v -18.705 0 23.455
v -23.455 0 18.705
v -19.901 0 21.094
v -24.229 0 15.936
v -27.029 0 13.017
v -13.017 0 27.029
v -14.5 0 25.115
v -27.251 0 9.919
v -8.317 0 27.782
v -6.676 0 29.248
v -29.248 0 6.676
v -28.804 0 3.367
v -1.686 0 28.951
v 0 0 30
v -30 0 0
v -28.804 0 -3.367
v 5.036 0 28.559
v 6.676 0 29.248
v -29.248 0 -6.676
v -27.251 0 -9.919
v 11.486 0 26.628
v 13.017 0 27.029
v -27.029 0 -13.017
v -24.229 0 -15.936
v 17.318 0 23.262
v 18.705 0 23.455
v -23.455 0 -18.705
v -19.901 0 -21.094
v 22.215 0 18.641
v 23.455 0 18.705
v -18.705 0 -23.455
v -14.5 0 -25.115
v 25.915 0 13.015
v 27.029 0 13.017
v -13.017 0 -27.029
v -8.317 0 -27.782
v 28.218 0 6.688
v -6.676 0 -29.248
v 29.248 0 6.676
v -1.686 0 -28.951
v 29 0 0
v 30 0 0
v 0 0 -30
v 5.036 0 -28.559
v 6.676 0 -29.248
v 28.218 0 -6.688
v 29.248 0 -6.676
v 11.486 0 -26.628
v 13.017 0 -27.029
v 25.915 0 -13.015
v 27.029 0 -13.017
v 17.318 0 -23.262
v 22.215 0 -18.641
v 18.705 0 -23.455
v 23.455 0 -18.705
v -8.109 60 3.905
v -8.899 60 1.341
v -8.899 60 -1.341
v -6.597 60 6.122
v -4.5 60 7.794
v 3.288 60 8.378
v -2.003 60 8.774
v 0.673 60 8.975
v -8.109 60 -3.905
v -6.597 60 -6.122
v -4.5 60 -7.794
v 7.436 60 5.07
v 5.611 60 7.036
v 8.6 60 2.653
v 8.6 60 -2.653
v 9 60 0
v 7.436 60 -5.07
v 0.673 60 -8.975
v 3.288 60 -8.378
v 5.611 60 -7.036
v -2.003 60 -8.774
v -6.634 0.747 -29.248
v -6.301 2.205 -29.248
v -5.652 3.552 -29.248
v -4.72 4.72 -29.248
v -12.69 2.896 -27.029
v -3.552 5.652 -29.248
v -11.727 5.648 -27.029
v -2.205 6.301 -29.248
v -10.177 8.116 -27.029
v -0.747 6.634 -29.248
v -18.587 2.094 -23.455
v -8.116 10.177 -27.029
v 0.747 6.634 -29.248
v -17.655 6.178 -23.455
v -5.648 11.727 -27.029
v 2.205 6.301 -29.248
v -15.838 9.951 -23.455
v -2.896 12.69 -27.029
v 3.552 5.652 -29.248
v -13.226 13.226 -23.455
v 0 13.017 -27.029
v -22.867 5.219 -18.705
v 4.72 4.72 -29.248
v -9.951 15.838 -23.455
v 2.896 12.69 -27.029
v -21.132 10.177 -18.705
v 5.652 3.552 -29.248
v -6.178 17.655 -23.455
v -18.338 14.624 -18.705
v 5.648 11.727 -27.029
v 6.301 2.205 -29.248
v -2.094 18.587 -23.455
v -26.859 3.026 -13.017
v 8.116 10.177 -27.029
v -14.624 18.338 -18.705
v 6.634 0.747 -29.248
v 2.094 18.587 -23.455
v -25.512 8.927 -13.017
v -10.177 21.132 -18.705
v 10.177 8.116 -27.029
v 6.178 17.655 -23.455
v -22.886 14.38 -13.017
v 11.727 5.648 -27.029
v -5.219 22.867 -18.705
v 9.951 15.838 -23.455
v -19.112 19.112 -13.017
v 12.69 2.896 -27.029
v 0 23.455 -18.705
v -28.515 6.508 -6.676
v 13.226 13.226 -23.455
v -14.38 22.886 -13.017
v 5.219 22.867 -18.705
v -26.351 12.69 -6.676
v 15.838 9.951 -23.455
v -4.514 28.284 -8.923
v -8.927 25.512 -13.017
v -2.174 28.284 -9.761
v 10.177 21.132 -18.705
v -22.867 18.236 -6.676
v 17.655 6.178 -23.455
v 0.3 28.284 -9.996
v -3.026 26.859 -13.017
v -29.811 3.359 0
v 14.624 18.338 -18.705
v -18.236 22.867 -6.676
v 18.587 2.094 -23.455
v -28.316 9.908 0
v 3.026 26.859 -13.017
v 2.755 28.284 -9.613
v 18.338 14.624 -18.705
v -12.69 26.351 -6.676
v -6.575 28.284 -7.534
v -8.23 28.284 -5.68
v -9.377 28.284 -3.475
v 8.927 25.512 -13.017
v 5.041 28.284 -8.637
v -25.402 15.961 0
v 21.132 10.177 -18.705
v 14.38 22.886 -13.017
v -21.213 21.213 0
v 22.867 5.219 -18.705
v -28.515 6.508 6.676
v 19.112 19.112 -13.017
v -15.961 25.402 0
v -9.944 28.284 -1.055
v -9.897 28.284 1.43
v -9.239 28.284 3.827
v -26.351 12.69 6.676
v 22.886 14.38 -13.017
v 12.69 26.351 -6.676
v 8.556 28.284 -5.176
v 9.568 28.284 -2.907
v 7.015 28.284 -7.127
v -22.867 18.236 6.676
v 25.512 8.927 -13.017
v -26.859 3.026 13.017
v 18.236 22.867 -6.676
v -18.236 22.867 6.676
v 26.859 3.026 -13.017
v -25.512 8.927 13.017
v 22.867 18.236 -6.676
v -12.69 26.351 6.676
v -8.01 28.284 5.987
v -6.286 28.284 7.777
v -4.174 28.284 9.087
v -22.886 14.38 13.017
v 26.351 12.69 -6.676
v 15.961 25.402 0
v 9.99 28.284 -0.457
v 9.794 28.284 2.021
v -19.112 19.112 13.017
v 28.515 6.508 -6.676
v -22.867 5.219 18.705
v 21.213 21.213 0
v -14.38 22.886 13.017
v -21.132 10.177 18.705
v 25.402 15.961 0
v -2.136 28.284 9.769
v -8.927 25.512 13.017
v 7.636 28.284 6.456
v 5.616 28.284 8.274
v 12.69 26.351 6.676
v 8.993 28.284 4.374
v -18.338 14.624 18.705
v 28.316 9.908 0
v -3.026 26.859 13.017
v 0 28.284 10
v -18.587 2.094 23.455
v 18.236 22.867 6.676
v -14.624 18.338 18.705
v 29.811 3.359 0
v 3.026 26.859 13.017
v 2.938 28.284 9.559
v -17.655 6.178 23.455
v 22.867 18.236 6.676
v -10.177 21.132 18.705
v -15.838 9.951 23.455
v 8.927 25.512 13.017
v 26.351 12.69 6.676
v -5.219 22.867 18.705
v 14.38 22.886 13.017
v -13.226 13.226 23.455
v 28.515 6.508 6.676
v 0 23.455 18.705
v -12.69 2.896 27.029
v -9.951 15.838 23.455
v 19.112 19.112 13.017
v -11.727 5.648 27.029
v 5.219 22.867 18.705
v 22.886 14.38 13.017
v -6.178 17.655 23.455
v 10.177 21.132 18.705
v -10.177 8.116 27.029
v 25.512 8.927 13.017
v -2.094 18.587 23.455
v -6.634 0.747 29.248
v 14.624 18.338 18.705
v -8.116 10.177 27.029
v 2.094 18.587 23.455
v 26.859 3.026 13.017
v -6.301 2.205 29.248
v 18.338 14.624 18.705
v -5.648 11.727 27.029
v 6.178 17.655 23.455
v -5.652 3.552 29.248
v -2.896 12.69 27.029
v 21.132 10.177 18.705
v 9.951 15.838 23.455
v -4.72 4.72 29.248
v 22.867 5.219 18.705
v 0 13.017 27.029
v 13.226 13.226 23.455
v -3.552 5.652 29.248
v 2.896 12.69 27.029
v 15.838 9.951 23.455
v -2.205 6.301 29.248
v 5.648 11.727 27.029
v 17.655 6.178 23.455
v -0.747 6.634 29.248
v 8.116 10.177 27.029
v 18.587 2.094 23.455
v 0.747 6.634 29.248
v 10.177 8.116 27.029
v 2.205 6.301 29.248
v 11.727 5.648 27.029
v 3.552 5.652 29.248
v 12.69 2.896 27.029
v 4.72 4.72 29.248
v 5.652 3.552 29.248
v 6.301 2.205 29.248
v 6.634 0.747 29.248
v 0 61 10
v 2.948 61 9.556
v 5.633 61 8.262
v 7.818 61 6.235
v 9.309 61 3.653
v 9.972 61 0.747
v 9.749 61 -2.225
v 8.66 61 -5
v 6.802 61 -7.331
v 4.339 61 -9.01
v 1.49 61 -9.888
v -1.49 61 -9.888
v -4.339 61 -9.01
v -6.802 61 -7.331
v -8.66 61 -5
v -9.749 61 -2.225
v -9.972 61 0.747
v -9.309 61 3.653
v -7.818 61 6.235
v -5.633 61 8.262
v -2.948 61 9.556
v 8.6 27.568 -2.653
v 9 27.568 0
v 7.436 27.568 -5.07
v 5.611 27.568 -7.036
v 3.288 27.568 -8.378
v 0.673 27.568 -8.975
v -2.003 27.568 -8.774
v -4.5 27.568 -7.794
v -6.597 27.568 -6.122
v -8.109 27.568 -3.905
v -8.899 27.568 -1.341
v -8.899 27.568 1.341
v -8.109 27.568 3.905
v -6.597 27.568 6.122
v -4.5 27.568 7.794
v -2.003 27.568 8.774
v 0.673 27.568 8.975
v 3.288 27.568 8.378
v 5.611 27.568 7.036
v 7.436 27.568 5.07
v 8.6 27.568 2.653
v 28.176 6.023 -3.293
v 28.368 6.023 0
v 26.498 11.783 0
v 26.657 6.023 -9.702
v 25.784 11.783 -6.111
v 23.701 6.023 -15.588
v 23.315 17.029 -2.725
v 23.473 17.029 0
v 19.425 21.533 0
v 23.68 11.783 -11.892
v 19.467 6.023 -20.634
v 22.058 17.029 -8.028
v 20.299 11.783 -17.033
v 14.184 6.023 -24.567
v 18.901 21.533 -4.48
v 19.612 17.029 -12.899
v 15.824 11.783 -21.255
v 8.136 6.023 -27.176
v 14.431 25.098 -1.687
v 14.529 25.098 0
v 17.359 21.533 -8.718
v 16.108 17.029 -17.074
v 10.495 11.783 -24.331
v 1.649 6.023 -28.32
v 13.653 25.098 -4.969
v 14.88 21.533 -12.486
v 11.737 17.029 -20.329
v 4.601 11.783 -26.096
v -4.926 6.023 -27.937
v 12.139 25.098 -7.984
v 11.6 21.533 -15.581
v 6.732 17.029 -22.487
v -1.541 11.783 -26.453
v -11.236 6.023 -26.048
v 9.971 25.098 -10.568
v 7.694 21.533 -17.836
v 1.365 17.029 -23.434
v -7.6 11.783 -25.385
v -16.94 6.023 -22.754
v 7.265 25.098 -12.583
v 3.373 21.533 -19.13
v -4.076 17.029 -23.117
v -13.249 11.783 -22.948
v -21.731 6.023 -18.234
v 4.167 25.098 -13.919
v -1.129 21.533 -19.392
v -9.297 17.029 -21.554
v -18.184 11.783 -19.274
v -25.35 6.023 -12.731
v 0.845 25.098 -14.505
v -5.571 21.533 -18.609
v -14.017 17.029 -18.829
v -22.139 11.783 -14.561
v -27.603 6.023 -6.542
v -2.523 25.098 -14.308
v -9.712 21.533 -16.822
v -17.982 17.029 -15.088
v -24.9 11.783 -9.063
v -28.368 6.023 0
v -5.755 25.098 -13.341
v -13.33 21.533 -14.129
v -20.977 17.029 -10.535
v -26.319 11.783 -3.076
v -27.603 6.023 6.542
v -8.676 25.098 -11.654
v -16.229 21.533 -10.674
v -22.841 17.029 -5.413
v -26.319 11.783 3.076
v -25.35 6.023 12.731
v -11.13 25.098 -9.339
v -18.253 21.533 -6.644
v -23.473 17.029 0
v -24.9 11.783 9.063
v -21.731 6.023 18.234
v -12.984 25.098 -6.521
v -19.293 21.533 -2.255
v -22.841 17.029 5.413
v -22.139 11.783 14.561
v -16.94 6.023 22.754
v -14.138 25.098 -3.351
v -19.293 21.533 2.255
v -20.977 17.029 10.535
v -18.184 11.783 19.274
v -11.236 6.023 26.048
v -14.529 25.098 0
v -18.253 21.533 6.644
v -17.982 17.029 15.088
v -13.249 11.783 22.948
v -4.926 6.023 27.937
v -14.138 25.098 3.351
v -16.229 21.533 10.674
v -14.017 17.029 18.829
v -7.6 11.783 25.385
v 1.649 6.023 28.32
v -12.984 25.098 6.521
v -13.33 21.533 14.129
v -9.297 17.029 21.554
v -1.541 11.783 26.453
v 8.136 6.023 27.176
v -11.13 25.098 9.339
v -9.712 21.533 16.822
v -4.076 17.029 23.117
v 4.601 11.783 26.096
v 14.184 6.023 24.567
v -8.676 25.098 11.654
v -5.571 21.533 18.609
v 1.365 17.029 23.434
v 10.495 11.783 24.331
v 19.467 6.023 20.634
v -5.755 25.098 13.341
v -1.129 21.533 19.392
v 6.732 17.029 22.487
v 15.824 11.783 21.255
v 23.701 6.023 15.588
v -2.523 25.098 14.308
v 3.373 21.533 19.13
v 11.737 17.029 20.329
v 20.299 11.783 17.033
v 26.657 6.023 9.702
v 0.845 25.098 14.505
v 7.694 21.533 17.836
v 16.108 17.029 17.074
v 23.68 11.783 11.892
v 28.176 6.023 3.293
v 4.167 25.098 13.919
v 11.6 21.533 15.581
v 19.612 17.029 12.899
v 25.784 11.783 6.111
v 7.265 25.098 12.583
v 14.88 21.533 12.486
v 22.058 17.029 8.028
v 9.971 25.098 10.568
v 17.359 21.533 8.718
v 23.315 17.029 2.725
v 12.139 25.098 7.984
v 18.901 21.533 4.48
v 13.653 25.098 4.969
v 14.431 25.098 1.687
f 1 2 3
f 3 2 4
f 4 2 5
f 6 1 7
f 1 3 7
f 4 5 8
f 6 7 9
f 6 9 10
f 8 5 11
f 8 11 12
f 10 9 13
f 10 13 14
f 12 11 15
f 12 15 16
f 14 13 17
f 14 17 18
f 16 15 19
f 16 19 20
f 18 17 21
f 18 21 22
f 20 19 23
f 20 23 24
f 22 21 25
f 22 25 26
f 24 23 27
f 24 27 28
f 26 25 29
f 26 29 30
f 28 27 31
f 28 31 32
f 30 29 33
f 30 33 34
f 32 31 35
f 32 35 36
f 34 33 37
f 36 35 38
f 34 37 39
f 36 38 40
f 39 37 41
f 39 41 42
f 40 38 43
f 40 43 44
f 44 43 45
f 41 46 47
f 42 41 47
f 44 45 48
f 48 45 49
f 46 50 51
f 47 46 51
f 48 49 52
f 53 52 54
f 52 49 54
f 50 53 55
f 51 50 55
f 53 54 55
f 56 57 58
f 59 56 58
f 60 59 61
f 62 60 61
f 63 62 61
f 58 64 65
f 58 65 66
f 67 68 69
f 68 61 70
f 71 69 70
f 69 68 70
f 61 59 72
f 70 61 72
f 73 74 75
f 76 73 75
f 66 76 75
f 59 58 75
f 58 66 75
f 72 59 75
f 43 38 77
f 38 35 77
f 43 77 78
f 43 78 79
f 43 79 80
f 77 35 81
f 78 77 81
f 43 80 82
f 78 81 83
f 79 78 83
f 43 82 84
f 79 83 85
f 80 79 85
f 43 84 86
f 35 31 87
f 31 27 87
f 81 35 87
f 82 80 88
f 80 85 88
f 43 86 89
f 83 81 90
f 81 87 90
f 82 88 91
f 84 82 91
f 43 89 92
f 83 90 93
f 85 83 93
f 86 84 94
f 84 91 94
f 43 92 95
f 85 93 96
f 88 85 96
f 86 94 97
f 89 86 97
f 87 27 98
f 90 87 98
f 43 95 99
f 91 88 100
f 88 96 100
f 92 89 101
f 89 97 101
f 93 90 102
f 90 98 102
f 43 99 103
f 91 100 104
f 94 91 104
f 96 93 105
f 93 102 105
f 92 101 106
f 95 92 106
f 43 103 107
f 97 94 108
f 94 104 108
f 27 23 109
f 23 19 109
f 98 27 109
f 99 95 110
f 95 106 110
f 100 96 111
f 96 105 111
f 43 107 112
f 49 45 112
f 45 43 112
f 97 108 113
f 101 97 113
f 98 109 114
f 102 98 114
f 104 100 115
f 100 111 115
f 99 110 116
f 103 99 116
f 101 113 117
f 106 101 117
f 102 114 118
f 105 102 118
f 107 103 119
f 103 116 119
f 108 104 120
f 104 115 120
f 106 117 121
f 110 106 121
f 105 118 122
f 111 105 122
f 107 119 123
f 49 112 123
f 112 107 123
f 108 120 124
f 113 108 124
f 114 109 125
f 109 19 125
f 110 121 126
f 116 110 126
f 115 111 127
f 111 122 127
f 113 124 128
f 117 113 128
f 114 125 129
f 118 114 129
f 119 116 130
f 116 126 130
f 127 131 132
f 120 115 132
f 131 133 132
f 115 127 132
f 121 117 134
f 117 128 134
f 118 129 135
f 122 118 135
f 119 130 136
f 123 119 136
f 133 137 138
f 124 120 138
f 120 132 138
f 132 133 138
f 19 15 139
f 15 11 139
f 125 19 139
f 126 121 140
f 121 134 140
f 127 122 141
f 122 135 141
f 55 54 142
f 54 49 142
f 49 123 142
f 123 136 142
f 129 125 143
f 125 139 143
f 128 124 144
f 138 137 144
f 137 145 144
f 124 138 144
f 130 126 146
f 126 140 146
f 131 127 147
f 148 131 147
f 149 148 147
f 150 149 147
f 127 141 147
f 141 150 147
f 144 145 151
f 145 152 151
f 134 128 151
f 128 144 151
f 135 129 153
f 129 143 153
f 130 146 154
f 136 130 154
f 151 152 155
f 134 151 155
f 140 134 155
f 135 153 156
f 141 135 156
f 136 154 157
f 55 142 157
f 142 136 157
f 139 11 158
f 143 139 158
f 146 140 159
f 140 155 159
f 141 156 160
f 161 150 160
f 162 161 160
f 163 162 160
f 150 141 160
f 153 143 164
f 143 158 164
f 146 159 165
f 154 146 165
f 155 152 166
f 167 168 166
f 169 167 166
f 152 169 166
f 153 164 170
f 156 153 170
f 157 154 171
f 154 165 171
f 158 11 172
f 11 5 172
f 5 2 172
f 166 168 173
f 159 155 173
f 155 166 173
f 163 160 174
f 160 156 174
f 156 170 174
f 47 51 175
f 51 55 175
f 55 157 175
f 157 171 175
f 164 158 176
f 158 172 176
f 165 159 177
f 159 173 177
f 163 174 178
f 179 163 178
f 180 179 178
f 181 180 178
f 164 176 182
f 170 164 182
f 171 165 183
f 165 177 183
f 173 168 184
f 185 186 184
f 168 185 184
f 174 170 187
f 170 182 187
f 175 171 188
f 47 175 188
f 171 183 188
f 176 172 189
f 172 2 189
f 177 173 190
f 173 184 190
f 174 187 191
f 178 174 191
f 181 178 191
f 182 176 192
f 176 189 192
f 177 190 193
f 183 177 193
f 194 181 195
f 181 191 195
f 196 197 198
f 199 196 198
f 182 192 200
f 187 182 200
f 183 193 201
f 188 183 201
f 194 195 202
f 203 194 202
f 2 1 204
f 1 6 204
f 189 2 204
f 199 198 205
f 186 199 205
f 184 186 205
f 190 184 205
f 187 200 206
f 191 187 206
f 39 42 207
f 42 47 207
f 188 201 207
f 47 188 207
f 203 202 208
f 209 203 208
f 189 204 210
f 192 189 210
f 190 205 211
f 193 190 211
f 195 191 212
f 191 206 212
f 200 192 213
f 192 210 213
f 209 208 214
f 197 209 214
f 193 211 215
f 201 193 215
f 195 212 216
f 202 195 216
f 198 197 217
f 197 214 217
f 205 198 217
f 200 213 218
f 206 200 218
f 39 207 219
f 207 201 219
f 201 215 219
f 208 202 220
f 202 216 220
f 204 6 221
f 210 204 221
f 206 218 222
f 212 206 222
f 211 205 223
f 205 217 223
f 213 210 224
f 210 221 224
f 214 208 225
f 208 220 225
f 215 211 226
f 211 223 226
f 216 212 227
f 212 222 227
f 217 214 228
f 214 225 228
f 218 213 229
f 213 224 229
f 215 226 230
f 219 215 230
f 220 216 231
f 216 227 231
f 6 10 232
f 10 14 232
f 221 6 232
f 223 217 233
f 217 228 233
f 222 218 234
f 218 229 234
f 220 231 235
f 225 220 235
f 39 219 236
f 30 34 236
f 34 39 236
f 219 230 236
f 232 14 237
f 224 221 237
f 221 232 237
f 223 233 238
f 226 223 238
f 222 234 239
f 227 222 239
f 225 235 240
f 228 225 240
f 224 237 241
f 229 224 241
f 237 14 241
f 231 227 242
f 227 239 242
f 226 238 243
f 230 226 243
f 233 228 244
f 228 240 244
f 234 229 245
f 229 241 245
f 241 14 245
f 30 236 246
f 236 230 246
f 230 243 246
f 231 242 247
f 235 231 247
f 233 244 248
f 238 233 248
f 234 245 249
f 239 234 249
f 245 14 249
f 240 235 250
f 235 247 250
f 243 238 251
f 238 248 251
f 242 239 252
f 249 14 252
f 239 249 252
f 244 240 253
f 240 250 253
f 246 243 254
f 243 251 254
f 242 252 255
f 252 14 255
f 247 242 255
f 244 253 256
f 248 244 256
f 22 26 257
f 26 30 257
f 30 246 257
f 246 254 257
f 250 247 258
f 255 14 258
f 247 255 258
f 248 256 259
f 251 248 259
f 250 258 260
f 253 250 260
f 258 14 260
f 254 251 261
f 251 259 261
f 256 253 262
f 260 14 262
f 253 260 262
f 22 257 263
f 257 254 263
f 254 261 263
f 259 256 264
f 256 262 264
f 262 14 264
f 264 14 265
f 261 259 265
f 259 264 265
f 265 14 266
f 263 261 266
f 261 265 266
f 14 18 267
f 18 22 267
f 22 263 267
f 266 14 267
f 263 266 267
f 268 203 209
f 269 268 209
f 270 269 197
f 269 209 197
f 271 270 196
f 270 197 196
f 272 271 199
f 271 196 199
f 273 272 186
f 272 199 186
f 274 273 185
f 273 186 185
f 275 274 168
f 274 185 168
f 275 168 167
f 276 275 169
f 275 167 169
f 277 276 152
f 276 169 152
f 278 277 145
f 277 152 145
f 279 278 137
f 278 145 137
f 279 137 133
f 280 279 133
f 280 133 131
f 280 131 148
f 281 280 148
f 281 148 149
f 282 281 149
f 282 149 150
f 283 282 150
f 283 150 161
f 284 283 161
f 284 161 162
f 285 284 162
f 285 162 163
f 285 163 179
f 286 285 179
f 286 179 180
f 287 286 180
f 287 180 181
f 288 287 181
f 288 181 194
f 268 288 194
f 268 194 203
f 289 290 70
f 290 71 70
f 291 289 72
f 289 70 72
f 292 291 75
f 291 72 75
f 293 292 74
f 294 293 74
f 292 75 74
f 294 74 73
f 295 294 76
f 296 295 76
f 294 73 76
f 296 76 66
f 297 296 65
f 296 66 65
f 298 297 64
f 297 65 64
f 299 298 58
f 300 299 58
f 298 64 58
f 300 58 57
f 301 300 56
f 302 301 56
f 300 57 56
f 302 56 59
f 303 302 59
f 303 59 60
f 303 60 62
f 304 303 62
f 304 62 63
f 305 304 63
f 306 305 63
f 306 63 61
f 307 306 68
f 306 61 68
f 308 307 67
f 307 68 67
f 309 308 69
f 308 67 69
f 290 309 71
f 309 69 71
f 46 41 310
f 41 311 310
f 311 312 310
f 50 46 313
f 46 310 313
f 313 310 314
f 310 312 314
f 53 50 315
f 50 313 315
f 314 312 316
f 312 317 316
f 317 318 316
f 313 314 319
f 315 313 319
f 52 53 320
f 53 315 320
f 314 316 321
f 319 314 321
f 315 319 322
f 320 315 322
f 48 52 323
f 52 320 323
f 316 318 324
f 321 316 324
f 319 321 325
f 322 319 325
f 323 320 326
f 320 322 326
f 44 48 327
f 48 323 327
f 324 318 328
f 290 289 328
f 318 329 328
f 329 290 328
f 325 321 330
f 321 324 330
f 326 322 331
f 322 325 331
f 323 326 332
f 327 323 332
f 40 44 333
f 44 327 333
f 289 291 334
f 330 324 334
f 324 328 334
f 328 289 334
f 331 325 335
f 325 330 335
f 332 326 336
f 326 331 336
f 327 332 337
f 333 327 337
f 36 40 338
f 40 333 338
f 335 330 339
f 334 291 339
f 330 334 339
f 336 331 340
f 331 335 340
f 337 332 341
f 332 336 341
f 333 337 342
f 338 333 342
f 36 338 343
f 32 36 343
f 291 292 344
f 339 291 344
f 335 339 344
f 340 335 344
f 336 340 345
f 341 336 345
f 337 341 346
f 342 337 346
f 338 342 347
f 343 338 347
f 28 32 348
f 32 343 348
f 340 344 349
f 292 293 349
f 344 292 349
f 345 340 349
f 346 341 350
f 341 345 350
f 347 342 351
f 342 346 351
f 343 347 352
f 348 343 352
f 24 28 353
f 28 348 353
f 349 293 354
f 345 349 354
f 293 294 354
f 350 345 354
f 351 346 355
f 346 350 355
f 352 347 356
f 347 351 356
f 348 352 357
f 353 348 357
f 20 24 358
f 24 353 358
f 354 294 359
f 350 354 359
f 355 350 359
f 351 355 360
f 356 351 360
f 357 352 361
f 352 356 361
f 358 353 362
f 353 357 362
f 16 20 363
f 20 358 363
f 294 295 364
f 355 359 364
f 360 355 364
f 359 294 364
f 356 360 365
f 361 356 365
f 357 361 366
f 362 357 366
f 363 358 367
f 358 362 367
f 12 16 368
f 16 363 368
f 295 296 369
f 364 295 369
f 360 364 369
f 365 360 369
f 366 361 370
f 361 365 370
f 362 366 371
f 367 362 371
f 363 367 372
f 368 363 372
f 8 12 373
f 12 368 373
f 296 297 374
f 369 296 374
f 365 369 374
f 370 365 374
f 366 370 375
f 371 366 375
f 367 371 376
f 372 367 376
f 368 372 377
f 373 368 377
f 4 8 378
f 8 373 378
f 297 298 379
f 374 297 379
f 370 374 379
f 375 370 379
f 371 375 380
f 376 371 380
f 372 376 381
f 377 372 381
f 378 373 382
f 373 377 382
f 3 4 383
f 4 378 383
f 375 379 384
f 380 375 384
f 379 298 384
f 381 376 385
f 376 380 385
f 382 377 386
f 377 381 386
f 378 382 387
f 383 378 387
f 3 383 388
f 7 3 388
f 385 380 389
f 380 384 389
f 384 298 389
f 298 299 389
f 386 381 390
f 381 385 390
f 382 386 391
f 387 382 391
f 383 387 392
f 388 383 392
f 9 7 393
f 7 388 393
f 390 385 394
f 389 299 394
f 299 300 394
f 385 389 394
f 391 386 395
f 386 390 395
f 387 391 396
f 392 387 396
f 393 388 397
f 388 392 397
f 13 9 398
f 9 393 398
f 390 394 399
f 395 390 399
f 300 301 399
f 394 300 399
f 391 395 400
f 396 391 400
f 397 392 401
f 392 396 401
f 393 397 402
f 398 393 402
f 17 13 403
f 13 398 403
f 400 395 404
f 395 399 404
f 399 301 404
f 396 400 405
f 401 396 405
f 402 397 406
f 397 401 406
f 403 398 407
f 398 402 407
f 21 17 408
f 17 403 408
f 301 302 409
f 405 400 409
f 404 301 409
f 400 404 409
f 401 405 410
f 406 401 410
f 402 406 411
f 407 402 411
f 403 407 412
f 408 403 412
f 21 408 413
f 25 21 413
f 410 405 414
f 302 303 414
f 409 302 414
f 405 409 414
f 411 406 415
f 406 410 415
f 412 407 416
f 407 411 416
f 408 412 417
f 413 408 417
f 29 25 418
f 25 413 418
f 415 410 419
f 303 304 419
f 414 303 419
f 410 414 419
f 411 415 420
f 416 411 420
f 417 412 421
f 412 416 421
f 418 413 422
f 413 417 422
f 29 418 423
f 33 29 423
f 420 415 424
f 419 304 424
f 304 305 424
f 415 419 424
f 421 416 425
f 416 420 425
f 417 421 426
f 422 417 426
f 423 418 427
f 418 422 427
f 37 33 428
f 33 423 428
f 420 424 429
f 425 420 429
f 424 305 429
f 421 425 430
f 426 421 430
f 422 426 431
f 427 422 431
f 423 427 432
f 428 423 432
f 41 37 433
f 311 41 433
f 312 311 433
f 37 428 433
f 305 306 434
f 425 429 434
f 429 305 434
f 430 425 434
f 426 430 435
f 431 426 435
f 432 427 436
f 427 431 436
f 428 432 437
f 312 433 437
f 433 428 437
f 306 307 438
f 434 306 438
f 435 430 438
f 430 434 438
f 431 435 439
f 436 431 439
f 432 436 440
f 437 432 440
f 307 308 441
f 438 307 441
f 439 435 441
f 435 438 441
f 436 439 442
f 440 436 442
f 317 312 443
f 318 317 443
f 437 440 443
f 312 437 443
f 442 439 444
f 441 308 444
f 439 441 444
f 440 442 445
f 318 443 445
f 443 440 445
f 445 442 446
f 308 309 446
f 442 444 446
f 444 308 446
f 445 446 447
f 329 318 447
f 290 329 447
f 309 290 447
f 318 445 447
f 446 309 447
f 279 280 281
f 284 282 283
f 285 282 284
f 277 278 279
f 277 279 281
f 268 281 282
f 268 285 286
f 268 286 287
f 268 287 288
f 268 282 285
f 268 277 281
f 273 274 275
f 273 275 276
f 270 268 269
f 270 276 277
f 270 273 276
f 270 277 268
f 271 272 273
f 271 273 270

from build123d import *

# Parameters (mm, degrees)
BOSS_EXTRUDE1_DEPTH      = 31
BOSS_EXTRUDE1_DEPTH_BACK = 4
SKETCH7_R                = 10
SKETCH10_R               = 30
CUT_EXTRUDE1_DEPTH       = 47


# Read off the part's stored shape, not the designer's step: Shell1
with BuildPart() as part:
    # Sketch5 → Revolve3 (revolve)
    with BuildSketch(Plane(origin=(0, 0, 0), x_dir=(1, 0, 0), z_dir=(0, 1, 0))):
        with BuildLine():
            Line((0, -30), (0, 30))
            ThreePointArc((0, 30), (30, 0), (0, -30))
        make_face()
    revolve(axis=Axis((0, 0, 30), (0, 0, -1)))

    # Sketch7 → Boss-Extrude1 (add, two sides: drawn at the far end of the back side and taken through both)
    with BuildSketch(Plane(origin=(0, 30, 0), x_dir=(1, 0, 0), z_dir=(0, 1, 0)).offset(-BOSS_EXTRUDE1_DEPTH_BACK)):
        with Locations(Location((0, 0, 0), (0, 0, 270))):
            Circle(SKETCH7_R)
    extrude(amount=BOSS_EXTRUDE1_DEPTH + BOSS_EXTRUDE1_DEPTH_BACK)

    # Sketch10 → Cut-Extrude1 (cut)
    with BuildSketch(Plane(origin=(0, 0, 0), x_dir=(1, 0, 0), z_dir=(0, 1, 0))):
        Circle(SKETCH10_R)
    extrude(amount=-CUT_EXTRUDE1_DEPTH, mode=Mode.SUBTRACT)

    # Shell1 outline → Shell1 (revolve, cut)
    with BuildSketch(Plane.XY):
        with BuildLine():
            ThreePointArc((29, -2.9e-08), (23.473389189, 17.029386366), (8.999999972, 27.568097513))
            Line((8.999999972, 27.568097513), (9, 60))
            Line((9, 60), (0, 60))
            Line((0, 60), (0, -2.9e-08))
            Line((0, -2.9e-08), (29, -2.9e-08))
        make_face()
    revolve(axis=Axis((0, 0, 0), (0, 1, 0)), mode=Mode.SUBTRACT)


solid = part.part
